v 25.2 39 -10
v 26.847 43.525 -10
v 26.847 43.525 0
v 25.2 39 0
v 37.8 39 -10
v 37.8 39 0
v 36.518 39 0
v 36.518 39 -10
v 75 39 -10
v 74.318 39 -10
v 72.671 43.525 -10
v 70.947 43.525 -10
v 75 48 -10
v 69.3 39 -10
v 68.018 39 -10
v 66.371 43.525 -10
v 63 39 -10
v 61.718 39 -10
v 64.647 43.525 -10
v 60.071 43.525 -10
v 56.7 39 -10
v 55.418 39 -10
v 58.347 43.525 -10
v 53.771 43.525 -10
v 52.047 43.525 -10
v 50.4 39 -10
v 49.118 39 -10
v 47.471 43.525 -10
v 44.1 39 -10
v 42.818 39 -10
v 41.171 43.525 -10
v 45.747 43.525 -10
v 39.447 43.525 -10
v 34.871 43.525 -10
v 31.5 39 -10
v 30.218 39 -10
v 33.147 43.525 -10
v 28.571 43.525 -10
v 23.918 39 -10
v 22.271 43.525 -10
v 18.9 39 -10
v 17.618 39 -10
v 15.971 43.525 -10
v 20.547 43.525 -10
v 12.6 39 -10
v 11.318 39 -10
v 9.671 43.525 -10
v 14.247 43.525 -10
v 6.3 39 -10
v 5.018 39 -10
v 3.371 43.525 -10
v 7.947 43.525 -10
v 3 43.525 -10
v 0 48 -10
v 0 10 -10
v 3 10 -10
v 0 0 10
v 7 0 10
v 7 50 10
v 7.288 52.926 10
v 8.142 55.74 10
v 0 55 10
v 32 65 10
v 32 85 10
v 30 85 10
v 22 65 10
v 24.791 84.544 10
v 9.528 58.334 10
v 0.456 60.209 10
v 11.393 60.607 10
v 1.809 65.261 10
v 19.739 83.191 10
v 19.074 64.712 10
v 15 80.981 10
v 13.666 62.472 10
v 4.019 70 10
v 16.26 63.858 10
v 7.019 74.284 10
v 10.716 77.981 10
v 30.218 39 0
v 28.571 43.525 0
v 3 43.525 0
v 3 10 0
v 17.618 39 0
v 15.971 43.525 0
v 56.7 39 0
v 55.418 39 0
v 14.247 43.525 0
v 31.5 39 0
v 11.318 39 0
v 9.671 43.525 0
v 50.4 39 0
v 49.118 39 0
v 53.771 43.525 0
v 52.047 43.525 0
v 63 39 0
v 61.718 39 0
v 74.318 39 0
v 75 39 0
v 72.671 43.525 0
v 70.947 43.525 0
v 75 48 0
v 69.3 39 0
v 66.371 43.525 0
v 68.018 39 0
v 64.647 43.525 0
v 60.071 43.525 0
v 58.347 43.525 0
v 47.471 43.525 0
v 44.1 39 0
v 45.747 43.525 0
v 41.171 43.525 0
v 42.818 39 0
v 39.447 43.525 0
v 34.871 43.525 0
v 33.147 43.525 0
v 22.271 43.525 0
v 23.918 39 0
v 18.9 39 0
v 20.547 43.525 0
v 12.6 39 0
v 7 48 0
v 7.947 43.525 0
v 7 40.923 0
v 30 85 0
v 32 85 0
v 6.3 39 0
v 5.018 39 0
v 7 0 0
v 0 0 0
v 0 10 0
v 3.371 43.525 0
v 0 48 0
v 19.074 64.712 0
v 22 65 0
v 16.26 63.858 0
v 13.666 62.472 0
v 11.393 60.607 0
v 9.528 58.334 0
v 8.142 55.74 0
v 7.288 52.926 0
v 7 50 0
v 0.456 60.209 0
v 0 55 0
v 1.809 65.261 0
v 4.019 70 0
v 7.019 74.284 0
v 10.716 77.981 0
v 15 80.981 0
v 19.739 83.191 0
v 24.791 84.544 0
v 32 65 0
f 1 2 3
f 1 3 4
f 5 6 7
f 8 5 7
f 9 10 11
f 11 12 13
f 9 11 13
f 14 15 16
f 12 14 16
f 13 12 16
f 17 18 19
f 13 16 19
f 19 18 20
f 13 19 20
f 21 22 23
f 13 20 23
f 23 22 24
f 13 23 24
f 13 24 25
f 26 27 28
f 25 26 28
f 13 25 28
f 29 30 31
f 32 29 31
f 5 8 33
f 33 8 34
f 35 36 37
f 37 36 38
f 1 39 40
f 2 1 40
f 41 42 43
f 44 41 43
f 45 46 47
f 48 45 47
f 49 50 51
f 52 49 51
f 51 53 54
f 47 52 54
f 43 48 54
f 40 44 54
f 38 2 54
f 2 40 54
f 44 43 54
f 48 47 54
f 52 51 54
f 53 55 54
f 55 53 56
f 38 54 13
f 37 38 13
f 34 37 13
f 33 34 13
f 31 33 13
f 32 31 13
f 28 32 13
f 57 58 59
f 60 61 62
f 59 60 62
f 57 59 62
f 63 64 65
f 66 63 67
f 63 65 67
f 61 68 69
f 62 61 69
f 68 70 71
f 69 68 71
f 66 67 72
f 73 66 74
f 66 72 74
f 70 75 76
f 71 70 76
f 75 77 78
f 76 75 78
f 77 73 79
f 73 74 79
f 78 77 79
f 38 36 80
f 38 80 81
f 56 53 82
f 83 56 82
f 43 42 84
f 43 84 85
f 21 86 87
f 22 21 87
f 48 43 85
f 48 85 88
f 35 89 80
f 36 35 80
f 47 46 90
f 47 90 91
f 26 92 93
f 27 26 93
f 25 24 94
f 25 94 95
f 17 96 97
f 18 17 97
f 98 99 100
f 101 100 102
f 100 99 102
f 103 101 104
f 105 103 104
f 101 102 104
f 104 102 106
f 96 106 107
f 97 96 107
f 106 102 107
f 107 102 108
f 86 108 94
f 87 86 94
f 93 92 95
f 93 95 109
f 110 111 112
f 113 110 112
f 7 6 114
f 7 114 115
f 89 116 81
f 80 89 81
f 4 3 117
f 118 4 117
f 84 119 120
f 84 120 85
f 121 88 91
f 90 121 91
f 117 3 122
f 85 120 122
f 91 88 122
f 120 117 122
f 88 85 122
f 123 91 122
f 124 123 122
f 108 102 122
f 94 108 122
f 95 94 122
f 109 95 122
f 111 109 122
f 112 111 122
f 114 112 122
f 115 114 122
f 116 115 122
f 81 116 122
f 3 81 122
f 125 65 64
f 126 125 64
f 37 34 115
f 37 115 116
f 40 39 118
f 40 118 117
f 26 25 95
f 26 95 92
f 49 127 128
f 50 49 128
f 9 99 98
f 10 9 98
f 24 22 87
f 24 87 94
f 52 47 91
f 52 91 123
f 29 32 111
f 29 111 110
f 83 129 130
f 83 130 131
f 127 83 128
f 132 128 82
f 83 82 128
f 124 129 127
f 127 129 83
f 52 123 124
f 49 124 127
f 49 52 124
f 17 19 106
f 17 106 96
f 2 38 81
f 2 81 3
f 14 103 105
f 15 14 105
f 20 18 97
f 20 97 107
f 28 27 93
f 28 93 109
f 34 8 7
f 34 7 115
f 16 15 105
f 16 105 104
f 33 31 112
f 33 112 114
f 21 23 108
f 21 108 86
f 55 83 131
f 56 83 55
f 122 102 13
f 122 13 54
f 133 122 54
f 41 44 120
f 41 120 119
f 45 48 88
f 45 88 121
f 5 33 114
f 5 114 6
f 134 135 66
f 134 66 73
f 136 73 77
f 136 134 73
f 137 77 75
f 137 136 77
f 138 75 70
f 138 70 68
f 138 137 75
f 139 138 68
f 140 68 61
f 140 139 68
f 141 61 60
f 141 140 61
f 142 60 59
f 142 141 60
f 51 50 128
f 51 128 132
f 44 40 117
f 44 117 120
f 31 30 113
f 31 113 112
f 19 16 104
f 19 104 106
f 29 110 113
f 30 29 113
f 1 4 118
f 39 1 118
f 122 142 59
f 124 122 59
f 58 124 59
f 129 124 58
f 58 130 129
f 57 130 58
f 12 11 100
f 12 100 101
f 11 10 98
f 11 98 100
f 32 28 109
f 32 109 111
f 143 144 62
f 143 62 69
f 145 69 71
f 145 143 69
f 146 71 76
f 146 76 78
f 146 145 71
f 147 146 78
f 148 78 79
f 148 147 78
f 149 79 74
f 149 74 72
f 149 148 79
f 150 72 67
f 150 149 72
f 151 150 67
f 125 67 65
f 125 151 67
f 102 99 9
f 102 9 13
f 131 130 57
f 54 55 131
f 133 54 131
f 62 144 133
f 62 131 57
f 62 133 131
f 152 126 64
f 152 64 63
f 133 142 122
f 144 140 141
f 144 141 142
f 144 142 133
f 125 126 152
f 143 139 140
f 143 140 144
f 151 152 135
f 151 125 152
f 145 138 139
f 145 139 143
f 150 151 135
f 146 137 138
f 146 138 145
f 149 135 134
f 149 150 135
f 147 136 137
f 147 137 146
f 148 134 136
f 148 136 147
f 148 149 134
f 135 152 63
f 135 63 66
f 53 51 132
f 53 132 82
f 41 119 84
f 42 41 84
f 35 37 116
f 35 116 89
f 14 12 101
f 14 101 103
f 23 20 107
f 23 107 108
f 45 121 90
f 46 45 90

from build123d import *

# Parameters (mm, degrees)
BOSS_EXTRUDE1_DEPTH             = 10
SKIZZE2_W                       = 75
SKIZZE2_H                       = 9
AUFSATZ_LINEAR_AUSTRAGEN1_DEPTH = 10
SCHNITT_LINEAR_AUSTRAGEN2_DEPTH = 10
SKIZZE4_W                       = 20
SKIZZE4_H                       = 48
AUFSATZ_LINEAR_AUSTRAGEN2_DEPTH = 3
SKIZZE5_W                       = 10
SKIZZE5_H                       = 10
SCHNITT_LINEAR_AUSTRAGEN3_DEPTH = 10


with BuildPart() as part:
    # Sketch1 → Boss-Extrude1 (new body)
    with BuildSketch(Plane.XY):
        with BuildLine():
            Line((7, 0), (0, 0))
            Line((0, 0), (0, 47.7))
            Line((0, 47.7), (0, 55))
            ThreePointArc((0, 55), (8.786796564, 76.213203436), (30, 85))
            Line((30, 85), (32, 85))
            Line((32, 85), (32, 65))
            Line((32, 65), (22, 65))
            ThreePointArc((22, 65), (11.393398282, 60.606601718), (7, 50))
            Line((7, 50), (7, 0))
        make_face()
    extrude(amount=BOSS_EXTRUDE1_DEPTH)

    # Skizze2 → Aufsatz-Linear austragen1 (add)
    with BuildSketch(Plane(origin=(0, 0, 0), x_dir=(-1, 0, 0), z_dir=(0, 0, -1))):
        with Locations((-37.5, 43.5)):
            Rectangle(SKIZZE2_W, SKIZZE2_H)
    extrude(amount=AUFSATZ_LINEAR_AUSTRAGEN1_DEPTH)

    # Skizze3 → Schnitt-Linear austragen2 (cut)
    with BuildSketch(Plane(origin=(0, 0, -10), x_dir=(-1, 0, 0), z_dir=(0, 0, -1))):
        Polygon((-3.370852377, 43.5254), (-1.647110898, 43.5254), (0, 39), (-5.017963275, 39), align=None)
        Polygon((-9.670852377, 43.5254), (-7.947110898, 43.5254), (-6.3, 39), (-11.317963275, 39), align=None)
        Polygon((-15.970852377, 43.5254), (-14.247110898, 43.5254), (-12.6, 39), (-17.617963275, 39), align=None)
        Polygon((-22.270852377, 43.5254), (-20.547110898, 43.5254), (-18.9, 39), (-23.917963275, 39), align=None)
        Polygon((-28.570852377, 43.5254), (-26.847110898, 43.5254), (-25.2, 39), (-30.217963275, 39), align=None)
        Polygon((-34.870852377, 43.5254), (-33.147110898, 43.5254), (-31.5, 39), (-36.517963275, 39), align=None)
        Polygon((-41.170852377, 43.5254), (-39.447110898, 43.5254), (-37.8, 39), (-42.817963275, 39), align=None)
        Polygon((-47.470852377, 43.5254), (-45.747110898, 43.5254), (-44.1, 39), (-49.117963275, 39), align=None)
        Polygon((-53.770852377, 43.5254), (-52.047110898, 43.5254), (-50.4, 39), (-55.417963275, 39), align=None)
        Polygon((-60.070852377, 43.5254), (-58.347110898, 43.5254), (-56.7, 39), (-61.717963275, 39), align=None)
        Polygon((-66.370852377, 43.5254), (-64.647110898, 43.5254), (-63, 39), (-68.017963275, 39), align=None)
        Polygon((-72.670852377, 43.5254), (-70.947110898, 43.5254), (-69.3, 39), (-74.317963275, 39), align=None)
    extrude(amount=-SCHNITT_LINEAR_AUSTRAGEN2_DEPTH, mode=Mode.SUBTRACT)

    # Skizze4 → Aufsatz-Linear austragen2 (add)
    with BuildSketch(Plane.ZY):
        with Locations((0, 24)):
            Rectangle(SKIZZE4_W, SKIZZE4_H)
    extrude(amount=-AUFSATZ_LINEAR_AUSTRAGEN2_DEPTH)

    # Skizze5 → Schnitt-Linear austragen3 (cut)
    with BuildSketch(Plane(origin=(3, 0, 0), x_dir=(0, 0, -1), z_dir=(1, 0, 0))):
        with Locations((5, 5)):
            Rectangle(SKIZZE5_W, SKIZZE5_H)
    extrude(amount=-SCHNITT_LINEAR_AUSTRAGEN3_DEPTH, mode=Mode.SUBTRACT)


solid = part.part
